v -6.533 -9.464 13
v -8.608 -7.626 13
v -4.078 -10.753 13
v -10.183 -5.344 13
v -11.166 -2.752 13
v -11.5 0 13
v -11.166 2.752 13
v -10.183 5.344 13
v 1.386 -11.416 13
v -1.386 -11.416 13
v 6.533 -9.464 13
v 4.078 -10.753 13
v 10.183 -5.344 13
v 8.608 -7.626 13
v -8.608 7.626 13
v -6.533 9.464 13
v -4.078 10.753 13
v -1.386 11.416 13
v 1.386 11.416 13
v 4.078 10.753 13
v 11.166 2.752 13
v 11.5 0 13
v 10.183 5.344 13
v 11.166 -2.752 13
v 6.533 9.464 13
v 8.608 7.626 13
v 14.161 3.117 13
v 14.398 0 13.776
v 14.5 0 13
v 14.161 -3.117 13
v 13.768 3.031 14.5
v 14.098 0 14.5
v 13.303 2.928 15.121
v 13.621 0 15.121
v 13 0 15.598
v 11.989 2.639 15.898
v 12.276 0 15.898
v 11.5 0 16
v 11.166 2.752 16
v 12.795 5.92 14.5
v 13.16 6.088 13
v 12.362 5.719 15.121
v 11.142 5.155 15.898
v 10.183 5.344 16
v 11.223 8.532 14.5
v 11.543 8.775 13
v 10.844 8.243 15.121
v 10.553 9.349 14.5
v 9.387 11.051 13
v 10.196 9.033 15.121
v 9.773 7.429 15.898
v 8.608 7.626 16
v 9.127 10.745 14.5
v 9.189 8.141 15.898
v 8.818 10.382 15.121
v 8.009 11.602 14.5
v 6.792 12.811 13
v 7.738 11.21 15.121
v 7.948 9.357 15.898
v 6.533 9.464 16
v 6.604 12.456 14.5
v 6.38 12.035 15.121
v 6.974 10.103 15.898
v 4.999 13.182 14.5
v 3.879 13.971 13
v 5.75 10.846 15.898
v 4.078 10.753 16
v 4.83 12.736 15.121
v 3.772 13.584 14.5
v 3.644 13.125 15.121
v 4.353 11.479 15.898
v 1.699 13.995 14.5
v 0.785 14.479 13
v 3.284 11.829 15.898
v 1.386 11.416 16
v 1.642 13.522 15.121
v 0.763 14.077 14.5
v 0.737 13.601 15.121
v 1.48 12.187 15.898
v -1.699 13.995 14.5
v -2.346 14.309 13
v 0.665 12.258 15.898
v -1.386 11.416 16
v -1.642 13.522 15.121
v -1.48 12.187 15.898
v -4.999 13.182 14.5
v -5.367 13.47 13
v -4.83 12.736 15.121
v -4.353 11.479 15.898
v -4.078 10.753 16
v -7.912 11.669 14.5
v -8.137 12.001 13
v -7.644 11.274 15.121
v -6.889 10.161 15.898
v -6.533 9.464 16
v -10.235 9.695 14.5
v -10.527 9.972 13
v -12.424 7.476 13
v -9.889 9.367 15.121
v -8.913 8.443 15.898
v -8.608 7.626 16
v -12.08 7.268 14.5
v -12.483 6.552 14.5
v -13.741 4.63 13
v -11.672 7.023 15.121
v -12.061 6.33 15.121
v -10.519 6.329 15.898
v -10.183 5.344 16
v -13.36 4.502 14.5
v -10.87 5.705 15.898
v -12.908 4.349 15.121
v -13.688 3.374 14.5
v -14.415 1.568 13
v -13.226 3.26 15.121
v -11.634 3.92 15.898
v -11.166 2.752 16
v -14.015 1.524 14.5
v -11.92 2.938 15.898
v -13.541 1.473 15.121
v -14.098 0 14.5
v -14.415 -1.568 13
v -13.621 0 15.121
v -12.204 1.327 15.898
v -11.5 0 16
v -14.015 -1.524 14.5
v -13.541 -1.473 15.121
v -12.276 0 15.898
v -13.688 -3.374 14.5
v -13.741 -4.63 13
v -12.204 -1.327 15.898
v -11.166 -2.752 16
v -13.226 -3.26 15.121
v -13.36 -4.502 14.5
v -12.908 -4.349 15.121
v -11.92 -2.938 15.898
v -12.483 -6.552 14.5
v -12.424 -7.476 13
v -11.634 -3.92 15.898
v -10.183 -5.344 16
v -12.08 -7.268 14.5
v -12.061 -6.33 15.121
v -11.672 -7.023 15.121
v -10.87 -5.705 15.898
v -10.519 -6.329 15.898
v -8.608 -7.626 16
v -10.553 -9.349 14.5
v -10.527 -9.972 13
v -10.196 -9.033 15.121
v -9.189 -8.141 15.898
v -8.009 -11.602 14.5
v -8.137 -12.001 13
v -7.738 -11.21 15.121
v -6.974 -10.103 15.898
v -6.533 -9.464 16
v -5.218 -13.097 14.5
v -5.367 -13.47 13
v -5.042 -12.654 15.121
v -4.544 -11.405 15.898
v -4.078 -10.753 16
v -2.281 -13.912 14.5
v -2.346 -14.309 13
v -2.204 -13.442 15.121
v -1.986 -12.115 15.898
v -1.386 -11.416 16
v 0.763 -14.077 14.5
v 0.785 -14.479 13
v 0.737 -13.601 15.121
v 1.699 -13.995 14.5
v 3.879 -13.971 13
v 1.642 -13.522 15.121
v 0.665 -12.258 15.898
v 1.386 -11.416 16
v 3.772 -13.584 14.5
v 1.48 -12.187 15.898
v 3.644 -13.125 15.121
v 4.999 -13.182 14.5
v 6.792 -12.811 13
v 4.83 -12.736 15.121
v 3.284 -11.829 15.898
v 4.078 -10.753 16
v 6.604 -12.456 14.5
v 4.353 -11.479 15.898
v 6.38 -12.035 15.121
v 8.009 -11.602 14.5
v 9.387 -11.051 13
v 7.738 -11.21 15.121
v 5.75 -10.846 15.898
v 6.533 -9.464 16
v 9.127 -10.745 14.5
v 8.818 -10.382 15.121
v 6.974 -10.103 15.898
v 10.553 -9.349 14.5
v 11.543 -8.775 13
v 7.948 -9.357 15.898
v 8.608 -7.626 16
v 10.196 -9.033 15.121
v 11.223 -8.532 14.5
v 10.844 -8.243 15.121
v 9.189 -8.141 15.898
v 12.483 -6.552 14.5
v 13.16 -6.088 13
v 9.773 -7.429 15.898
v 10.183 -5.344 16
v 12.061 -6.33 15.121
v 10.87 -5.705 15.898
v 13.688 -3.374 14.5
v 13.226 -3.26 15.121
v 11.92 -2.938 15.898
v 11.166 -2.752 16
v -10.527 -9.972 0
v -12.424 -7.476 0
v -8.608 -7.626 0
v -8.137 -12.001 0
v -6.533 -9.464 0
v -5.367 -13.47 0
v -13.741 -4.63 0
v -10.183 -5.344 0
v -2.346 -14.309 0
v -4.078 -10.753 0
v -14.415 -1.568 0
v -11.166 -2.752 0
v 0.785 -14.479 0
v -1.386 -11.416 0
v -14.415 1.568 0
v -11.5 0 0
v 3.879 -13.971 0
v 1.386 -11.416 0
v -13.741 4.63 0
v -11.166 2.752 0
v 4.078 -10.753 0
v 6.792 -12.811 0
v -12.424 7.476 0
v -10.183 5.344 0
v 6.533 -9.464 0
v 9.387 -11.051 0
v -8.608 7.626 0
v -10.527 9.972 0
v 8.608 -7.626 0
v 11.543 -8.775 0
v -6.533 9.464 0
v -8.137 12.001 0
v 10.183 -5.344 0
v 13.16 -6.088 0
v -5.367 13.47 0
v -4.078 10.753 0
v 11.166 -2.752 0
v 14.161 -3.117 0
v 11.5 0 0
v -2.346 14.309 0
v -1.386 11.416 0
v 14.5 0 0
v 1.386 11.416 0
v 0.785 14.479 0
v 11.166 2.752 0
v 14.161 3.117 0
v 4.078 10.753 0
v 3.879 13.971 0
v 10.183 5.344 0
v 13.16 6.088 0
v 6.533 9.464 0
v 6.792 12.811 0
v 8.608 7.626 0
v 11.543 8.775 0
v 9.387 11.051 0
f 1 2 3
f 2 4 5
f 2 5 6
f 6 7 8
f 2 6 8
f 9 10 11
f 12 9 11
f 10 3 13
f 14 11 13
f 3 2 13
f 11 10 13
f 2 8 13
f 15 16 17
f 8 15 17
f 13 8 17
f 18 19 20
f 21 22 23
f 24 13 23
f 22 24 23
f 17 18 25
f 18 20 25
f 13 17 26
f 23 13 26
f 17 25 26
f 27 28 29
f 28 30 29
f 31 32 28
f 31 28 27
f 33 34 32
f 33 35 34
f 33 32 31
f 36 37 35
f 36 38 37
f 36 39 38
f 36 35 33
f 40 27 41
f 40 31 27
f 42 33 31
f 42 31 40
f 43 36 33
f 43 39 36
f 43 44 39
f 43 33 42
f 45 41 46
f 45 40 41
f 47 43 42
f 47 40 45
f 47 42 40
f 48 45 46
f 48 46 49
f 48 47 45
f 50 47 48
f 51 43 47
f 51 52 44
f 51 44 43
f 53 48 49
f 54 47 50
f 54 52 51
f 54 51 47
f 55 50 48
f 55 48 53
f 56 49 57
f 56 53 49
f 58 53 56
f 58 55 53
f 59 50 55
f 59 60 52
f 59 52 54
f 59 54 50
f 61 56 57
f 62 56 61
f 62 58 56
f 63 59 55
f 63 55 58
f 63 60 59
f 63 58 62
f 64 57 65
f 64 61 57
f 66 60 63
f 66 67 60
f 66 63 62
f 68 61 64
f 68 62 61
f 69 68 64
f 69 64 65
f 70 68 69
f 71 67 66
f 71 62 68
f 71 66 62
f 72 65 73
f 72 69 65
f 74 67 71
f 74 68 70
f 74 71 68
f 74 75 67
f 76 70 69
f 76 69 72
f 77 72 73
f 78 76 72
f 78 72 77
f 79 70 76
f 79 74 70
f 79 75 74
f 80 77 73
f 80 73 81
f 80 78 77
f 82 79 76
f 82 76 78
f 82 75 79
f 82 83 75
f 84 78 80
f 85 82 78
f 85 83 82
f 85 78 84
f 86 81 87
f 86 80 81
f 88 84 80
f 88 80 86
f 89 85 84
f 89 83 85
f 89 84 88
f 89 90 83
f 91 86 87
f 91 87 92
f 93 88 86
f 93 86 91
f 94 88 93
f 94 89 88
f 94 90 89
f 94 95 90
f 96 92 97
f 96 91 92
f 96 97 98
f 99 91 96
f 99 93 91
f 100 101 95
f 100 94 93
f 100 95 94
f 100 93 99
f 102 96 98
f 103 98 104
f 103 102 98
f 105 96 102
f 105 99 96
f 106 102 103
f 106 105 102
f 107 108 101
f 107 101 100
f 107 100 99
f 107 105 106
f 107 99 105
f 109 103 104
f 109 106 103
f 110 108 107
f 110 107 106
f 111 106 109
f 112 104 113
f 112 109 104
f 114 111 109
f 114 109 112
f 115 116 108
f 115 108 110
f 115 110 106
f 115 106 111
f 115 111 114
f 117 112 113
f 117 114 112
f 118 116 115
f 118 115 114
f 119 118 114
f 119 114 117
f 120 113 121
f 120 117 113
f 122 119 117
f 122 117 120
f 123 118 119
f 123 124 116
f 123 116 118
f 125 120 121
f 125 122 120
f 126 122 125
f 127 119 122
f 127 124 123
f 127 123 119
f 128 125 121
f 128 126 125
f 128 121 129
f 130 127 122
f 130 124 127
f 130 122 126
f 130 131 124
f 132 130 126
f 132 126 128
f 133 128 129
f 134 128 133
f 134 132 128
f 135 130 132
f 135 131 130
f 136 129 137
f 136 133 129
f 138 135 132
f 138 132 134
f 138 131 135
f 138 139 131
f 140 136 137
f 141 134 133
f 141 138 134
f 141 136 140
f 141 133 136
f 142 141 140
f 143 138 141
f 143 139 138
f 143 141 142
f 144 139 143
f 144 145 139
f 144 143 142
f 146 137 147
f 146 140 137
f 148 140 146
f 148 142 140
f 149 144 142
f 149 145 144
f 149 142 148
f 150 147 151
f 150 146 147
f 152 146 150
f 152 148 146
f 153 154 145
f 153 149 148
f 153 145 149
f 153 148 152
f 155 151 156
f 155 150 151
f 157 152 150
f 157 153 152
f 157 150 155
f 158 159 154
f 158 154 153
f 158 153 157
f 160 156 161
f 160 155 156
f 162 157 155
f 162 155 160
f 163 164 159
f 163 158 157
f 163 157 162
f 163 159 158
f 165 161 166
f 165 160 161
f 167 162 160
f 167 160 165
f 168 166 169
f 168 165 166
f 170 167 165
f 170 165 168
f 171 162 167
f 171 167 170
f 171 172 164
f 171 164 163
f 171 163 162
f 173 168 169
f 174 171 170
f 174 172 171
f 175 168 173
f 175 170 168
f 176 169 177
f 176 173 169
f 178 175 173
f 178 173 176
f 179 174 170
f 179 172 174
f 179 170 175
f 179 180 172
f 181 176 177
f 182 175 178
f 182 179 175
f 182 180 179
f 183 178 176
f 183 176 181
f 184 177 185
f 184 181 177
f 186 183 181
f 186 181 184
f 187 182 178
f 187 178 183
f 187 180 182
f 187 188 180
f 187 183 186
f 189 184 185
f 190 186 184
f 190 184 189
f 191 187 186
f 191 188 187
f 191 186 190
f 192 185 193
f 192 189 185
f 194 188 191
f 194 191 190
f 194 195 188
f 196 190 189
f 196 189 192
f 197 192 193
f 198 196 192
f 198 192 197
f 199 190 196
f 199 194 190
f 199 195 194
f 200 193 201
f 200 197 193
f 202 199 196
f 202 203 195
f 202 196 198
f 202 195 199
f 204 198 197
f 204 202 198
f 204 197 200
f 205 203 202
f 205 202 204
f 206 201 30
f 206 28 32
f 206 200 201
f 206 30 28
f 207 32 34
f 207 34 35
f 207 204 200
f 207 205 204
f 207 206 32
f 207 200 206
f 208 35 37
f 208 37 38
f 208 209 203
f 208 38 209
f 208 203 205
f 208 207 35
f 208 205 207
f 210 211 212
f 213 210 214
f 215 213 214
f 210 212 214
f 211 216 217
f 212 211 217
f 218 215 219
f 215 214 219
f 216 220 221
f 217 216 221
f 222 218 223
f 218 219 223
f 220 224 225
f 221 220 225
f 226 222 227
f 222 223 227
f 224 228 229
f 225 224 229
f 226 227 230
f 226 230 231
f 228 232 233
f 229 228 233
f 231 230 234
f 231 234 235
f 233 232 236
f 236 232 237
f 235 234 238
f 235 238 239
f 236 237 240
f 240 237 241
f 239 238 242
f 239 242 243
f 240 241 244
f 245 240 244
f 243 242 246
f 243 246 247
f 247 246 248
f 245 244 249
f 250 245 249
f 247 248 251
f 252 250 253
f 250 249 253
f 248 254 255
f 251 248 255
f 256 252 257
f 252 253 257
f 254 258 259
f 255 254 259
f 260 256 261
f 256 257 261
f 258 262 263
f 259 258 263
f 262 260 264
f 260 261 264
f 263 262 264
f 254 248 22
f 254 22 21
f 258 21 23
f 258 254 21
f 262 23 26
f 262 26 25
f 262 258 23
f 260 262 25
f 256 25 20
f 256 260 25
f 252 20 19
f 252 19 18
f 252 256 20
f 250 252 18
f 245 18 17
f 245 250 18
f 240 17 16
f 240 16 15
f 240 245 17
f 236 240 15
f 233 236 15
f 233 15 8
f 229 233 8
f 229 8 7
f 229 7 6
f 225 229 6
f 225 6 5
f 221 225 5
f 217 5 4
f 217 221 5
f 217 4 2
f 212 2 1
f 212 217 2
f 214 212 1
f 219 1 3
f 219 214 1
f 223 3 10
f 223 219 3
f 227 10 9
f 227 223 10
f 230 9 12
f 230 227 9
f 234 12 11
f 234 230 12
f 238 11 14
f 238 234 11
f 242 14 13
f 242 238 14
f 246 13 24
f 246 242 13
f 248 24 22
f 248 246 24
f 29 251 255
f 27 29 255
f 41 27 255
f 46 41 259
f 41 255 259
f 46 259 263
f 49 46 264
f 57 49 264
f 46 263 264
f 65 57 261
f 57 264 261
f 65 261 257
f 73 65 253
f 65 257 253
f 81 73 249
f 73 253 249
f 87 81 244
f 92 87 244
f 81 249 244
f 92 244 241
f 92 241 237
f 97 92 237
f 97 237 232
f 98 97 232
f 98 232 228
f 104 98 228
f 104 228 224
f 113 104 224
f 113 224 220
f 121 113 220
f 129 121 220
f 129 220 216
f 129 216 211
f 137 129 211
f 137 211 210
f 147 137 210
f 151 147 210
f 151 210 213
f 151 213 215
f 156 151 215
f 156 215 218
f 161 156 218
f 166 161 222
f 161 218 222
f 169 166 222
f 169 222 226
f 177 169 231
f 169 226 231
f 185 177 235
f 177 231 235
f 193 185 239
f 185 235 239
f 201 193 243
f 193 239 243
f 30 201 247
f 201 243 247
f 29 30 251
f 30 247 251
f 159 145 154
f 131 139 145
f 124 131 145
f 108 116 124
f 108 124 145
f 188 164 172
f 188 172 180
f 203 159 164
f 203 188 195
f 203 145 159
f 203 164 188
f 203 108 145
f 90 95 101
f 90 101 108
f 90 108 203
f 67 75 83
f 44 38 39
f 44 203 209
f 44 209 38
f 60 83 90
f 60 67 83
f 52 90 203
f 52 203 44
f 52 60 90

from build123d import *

# Parameters (mm, degrees)
F0_R     = 14.5
F0_R_2   = 11.5
F1_DEPTH = 13
F2_R     = 14.5
F2_R_2   = 11.5
F3_DEPTH = 3
F4_R     = 3


with BuildPart() as f1:
    # F0 (on Top) → F1 (new body)
    with BuildSketch(Plane.XY):
        Circle(F0_R)
        Circle(F0_R_2, mode=Mode.SUBTRACT)
    extrude(amount=F1_DEPTH)

    # F2 (on face) → F3 (join)
    with BuildSketch(Plane.XY.offset(13)):
        Circle(F2_R)
        Circle(F2_R_2, mode=Mode.SUBTRACT)
        Circle(F2_R_2)
    extrude(amount=F3_DEPTH)

    # F4
    f4_edges = [f1.edges().sort_by_distance(p)[0] for p in [
        (-14.5, 0, 16),
    ]]
    fillet(f4_edges, radius=F4_R)


solid = f1.part
